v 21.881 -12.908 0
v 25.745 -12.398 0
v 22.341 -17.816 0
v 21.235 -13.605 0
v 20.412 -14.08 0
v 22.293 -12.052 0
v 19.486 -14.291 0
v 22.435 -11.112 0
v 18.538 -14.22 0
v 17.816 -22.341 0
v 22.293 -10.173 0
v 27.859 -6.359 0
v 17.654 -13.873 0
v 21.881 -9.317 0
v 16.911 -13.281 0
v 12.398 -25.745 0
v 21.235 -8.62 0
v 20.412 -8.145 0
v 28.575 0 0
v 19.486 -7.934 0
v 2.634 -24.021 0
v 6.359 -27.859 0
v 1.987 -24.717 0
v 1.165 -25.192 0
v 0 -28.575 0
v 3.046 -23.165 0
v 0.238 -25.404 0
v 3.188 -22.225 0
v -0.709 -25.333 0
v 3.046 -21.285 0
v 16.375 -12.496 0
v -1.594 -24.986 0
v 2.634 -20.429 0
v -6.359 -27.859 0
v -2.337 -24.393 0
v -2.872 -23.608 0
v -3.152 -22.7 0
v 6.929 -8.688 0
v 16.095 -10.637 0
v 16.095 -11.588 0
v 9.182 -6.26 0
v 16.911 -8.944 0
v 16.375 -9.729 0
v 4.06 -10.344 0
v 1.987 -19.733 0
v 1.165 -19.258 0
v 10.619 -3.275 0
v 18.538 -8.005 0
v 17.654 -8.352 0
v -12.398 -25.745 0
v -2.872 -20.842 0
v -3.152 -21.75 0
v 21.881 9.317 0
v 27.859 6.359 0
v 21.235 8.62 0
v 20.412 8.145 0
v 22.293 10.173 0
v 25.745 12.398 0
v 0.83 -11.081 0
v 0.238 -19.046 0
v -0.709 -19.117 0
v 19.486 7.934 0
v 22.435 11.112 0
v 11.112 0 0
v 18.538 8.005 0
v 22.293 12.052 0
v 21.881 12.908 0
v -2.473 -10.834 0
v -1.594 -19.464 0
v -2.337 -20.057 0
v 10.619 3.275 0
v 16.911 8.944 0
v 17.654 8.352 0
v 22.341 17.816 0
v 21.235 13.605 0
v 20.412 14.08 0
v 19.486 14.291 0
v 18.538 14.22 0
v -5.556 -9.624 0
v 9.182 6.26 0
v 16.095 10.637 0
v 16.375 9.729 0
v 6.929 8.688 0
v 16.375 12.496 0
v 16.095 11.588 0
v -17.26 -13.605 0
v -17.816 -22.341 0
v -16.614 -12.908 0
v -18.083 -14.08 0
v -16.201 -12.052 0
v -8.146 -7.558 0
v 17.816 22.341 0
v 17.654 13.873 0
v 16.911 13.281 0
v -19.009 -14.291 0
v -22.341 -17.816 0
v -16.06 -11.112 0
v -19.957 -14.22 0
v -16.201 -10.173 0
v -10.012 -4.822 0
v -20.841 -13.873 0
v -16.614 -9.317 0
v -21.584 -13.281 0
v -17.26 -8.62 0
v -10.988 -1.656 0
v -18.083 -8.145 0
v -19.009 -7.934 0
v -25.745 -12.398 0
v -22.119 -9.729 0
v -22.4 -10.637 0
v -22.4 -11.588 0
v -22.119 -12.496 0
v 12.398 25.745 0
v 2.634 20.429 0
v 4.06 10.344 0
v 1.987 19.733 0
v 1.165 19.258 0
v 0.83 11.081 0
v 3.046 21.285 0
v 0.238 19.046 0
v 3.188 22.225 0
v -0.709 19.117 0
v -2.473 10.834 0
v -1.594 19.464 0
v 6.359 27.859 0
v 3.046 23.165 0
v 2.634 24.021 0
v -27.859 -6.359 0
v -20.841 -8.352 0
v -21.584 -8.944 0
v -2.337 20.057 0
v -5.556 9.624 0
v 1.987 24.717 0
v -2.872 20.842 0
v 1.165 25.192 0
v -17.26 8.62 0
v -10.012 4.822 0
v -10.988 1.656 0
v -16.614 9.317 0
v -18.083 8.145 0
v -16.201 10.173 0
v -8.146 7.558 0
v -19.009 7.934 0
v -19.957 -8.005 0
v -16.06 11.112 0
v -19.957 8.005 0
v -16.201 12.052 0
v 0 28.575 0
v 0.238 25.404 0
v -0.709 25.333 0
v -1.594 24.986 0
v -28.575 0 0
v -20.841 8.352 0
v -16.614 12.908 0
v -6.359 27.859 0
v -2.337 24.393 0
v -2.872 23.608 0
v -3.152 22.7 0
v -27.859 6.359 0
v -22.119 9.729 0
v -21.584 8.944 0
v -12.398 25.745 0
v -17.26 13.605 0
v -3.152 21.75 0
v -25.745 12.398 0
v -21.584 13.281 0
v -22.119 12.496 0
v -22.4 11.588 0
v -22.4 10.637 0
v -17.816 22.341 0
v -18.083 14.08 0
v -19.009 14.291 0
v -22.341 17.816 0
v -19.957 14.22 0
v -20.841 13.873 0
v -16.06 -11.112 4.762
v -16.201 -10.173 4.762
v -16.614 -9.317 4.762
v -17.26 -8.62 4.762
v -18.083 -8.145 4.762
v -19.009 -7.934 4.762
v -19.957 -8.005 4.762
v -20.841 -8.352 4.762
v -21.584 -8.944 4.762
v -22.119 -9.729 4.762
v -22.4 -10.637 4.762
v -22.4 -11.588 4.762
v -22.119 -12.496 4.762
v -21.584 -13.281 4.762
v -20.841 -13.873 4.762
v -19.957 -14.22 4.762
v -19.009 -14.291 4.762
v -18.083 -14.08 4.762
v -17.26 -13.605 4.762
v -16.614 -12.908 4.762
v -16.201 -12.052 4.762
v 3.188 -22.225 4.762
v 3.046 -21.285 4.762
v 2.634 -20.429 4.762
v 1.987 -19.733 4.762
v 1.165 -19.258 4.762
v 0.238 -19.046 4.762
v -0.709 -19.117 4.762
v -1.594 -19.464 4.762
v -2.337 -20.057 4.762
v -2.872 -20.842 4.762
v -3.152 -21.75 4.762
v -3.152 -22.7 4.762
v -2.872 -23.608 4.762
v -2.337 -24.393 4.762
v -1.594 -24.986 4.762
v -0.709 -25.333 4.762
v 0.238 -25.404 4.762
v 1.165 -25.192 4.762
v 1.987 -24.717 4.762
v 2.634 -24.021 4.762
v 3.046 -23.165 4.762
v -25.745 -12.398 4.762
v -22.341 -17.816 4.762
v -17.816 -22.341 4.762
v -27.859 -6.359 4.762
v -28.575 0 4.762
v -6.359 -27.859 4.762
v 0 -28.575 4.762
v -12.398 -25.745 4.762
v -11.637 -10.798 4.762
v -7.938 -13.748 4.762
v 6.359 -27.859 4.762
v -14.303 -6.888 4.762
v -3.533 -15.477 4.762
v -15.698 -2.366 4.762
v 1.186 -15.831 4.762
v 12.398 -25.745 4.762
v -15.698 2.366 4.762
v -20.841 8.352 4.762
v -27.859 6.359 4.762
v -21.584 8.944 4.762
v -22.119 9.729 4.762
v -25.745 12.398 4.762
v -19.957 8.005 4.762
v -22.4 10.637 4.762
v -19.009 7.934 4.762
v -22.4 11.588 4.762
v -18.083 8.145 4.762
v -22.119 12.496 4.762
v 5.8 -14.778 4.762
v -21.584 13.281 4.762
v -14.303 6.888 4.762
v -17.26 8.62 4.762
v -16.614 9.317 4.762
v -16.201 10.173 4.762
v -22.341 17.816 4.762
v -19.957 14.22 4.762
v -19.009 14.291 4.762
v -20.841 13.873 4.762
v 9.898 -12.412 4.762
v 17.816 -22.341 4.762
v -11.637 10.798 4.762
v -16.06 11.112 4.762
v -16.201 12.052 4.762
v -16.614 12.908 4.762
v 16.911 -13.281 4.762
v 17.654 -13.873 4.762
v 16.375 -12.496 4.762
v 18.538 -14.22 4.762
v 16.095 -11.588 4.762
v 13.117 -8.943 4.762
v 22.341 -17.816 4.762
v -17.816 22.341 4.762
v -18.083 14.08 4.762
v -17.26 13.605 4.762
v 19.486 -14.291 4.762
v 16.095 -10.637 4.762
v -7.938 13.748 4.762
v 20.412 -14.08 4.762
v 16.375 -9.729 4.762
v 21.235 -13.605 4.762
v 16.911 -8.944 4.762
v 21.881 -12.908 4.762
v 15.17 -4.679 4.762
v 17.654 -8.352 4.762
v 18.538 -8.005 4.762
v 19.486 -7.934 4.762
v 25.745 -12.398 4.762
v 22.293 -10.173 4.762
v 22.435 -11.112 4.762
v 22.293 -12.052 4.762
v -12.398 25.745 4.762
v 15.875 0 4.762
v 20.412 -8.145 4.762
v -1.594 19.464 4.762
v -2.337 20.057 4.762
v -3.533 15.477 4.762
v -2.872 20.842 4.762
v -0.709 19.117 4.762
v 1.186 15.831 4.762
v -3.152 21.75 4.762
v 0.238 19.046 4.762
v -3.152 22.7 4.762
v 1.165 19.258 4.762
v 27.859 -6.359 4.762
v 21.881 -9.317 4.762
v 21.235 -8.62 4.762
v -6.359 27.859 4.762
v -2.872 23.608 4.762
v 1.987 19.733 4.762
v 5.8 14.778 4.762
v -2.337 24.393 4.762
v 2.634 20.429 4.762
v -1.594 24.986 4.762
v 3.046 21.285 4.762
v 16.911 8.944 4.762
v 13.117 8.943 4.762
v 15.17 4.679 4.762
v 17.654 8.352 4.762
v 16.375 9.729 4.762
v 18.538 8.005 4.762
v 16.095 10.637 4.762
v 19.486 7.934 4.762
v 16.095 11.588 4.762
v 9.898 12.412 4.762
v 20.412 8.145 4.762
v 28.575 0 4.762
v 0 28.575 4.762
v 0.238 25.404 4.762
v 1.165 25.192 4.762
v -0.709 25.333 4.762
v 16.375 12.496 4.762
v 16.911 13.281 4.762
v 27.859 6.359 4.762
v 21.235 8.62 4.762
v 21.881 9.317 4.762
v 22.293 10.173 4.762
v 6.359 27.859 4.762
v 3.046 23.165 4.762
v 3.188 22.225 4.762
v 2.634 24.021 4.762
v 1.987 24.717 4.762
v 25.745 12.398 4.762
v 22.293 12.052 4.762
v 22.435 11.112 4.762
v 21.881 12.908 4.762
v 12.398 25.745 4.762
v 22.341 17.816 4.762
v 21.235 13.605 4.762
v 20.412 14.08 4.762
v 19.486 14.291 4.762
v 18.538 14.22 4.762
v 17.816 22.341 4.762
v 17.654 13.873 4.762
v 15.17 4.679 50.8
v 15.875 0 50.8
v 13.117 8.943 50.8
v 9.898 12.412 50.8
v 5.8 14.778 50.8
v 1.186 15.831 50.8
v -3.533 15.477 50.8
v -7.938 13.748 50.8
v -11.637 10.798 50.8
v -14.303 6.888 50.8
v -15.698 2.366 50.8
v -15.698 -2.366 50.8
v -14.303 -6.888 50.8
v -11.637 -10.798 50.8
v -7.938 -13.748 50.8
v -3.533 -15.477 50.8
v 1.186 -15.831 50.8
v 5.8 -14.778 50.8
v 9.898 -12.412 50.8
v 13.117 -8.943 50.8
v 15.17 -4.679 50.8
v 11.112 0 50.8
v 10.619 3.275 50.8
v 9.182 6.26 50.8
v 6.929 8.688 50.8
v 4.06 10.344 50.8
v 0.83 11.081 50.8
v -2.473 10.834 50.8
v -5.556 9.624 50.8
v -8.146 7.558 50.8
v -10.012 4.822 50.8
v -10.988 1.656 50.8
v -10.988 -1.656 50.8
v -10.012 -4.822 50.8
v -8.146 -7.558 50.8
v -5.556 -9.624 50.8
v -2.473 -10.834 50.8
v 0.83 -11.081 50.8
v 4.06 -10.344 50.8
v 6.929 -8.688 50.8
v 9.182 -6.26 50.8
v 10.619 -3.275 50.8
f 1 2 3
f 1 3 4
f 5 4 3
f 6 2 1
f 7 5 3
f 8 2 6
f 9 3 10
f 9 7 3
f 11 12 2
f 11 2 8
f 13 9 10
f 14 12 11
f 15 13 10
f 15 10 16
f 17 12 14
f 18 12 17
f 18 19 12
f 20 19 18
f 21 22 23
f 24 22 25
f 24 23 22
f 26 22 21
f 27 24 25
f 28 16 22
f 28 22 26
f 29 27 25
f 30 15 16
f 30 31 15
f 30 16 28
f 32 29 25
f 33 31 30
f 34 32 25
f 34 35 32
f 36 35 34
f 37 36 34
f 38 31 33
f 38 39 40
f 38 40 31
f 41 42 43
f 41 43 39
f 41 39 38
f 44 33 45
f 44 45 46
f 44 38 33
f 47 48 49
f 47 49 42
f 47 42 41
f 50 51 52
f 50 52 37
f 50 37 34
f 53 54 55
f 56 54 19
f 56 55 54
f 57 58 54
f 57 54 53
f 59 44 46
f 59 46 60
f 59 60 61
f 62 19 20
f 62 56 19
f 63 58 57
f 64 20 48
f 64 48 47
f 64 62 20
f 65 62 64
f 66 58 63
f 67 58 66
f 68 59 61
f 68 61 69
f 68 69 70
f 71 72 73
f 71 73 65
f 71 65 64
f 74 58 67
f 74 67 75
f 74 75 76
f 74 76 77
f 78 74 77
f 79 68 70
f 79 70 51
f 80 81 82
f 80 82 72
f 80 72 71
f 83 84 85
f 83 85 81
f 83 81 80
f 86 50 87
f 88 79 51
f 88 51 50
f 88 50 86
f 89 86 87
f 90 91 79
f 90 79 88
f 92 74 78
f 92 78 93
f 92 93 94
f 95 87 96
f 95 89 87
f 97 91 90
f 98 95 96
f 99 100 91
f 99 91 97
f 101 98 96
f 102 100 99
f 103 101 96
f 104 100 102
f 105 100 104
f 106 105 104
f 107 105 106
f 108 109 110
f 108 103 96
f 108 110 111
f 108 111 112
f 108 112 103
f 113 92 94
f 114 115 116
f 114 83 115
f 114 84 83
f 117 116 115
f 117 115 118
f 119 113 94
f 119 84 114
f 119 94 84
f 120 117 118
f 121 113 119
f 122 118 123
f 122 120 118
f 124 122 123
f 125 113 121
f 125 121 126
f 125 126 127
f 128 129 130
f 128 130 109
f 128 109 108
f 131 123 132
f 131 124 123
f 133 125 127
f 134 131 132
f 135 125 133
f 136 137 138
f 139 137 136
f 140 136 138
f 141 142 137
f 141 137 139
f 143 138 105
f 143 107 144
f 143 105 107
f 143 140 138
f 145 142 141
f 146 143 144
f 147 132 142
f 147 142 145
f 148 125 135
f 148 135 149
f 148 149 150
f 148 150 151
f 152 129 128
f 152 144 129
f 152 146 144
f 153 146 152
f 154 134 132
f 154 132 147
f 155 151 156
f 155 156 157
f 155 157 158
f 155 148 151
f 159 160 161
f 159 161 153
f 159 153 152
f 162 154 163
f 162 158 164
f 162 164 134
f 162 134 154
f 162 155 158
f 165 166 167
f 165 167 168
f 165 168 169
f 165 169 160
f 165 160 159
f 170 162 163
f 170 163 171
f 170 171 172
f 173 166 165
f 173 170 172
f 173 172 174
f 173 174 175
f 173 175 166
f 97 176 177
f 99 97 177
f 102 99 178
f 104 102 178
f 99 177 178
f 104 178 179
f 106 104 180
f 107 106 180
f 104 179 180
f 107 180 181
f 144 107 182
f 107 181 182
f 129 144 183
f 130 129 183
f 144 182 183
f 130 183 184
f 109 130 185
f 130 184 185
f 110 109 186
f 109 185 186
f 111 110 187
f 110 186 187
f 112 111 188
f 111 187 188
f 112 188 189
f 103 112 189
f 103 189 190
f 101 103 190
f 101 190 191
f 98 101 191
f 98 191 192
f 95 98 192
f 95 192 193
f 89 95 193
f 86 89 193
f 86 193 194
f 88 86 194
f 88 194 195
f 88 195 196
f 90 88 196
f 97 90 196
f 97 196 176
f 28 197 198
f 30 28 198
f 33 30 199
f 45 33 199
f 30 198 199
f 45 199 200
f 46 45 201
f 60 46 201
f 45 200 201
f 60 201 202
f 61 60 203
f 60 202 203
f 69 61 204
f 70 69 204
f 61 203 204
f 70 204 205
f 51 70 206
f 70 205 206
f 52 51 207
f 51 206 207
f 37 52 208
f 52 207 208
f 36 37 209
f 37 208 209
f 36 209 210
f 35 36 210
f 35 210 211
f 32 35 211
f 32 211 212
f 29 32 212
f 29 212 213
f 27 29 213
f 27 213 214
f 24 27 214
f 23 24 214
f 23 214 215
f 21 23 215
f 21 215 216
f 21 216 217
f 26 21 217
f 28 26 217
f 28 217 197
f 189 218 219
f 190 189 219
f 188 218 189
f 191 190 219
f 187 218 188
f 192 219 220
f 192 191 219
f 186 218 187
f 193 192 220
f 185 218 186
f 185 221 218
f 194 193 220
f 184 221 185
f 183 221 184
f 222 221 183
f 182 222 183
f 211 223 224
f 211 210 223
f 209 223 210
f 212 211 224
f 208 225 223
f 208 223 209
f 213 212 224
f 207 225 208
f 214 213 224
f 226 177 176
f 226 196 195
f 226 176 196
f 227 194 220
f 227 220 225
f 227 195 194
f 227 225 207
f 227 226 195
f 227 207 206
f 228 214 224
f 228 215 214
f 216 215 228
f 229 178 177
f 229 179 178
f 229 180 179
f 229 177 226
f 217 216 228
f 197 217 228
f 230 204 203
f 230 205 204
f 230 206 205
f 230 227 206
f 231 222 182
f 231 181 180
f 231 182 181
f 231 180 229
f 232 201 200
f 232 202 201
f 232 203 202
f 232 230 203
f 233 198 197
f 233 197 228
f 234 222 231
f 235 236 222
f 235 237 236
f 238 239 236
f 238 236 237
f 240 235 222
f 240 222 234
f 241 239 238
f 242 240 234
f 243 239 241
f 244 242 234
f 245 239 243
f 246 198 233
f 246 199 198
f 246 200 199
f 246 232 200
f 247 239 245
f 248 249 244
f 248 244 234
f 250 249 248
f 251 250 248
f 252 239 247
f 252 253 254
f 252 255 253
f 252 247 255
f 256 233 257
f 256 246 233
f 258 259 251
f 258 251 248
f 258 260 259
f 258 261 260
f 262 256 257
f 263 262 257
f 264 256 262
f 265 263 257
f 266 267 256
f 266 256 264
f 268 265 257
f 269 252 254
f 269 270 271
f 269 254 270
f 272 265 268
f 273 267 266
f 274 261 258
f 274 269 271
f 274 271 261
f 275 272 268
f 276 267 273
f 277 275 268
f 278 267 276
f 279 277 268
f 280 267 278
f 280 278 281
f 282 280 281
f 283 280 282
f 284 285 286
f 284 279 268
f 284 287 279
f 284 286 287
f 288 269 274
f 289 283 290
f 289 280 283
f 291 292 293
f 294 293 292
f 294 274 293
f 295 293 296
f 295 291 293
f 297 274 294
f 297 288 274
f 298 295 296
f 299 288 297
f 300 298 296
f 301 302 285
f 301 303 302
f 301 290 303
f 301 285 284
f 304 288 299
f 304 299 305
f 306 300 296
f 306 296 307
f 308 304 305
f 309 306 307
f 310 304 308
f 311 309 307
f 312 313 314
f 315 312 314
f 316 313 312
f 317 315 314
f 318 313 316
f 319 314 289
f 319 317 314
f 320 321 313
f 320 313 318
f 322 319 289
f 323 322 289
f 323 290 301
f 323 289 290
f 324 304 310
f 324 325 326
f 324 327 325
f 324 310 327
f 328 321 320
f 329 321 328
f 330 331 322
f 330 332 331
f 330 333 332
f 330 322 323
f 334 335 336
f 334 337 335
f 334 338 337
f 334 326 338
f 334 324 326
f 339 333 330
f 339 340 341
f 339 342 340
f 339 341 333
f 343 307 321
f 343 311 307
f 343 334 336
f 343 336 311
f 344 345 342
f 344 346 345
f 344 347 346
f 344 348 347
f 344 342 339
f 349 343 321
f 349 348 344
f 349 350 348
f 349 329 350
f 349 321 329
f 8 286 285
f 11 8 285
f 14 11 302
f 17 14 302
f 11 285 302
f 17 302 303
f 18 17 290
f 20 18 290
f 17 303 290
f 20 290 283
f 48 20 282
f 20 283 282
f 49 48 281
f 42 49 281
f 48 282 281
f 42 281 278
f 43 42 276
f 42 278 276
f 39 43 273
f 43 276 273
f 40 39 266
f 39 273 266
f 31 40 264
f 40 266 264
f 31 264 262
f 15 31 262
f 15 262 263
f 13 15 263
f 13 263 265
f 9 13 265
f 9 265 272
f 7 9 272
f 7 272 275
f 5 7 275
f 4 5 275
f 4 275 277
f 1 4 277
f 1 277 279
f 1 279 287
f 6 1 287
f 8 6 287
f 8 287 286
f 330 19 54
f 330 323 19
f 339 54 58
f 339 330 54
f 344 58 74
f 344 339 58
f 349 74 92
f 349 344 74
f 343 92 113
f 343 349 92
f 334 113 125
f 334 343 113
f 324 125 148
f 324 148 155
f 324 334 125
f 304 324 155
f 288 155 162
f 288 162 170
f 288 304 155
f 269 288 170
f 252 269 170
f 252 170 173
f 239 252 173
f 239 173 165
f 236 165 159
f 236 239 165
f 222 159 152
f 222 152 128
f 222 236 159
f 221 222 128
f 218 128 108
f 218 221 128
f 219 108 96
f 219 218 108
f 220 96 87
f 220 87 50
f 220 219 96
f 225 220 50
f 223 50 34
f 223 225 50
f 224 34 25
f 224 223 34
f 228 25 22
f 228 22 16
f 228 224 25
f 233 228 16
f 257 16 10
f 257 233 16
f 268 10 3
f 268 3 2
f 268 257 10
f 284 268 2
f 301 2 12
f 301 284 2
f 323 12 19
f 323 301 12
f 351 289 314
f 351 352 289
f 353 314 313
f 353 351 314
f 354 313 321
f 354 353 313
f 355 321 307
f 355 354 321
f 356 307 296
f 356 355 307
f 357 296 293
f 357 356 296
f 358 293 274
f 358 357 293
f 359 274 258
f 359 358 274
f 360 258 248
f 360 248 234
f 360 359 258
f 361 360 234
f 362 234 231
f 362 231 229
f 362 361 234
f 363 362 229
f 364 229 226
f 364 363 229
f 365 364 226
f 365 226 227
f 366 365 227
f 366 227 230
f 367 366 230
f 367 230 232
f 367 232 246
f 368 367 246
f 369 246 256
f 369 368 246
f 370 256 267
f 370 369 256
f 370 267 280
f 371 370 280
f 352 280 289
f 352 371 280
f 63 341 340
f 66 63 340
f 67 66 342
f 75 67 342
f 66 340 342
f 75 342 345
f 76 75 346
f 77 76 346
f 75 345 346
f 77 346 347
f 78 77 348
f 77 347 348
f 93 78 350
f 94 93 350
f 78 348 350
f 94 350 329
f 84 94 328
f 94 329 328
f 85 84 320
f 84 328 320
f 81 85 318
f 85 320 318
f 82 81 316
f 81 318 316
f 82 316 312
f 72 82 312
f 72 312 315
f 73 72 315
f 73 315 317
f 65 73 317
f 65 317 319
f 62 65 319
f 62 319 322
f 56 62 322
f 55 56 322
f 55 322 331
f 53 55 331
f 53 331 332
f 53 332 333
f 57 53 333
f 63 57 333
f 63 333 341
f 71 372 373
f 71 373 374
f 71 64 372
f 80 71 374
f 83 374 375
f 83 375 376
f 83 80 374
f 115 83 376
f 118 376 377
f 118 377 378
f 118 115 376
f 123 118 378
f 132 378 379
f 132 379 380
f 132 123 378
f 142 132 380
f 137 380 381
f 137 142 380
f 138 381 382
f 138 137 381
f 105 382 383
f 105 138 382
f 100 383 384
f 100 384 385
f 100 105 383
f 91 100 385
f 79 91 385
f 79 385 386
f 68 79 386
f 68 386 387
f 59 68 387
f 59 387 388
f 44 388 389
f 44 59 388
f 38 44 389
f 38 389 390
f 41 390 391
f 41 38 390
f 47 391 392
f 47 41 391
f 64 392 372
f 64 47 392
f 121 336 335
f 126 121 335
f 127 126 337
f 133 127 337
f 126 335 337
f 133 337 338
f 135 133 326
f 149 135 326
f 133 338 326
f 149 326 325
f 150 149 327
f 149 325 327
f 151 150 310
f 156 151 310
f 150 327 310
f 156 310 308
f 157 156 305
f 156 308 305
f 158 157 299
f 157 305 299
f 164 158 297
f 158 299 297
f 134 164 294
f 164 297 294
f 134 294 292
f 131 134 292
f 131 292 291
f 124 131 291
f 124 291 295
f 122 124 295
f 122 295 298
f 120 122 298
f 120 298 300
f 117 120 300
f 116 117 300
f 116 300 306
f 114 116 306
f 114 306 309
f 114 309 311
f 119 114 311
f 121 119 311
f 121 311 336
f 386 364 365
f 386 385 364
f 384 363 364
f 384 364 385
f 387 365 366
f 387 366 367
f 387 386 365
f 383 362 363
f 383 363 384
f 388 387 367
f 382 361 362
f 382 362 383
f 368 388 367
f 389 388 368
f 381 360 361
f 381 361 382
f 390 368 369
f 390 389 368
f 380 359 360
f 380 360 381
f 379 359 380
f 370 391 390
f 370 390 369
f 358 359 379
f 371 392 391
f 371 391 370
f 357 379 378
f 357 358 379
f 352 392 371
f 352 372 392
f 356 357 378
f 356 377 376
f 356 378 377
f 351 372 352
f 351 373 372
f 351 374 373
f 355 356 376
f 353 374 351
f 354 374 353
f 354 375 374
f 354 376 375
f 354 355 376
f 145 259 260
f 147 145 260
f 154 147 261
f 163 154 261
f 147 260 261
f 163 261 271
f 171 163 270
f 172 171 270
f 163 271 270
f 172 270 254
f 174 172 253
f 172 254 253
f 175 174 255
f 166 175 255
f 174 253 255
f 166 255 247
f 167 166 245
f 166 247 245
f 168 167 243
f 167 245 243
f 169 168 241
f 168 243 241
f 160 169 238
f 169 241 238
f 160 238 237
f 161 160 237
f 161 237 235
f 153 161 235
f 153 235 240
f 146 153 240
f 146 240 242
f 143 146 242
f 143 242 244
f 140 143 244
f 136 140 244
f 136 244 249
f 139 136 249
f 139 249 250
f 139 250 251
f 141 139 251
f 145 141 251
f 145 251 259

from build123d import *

# Parameters (mm, degrees)
F2_R     = 3.1877
F3_DEPTH = 25.4


with BuildPart() as f1:
    # F0 (on Front) → F1 (revolve)
    with BuildSketch(Plane.XZ):
        Polygon((11.1125, 50.8), (11.1125, 0), (28.575, 0), (28.575, 4.7625), (15.875, 4.7625), (15.875, 50.8), align=None)
    revolve(axis=Axis((0, 0, 24.967514), (0, 0, 1)))

    # F2 (on face) → F3 (cut)
    with BuildSketch(Plane.XY.offset(4.7625)):
        with Locations((0, 22.225)):
            Circle(F2_R)
        with Locations((19.247415, 11.1125)):
            Circle(F2_R)
        with Locations((19.247415, -11.1125)):
            Circle(F2_R)
        with Locations((0, -22.225)):
            Circle(F2_R)
        with Locations((-19.247415, -11.1125)):
            Circle(F2_R)
        with Locations((-19.247415, 11.1125)):
            Circle(F2_R)
    extrude(amount=-F3_DEPTH, mode=Mode.SUBTRACT)


solid = f1.part
